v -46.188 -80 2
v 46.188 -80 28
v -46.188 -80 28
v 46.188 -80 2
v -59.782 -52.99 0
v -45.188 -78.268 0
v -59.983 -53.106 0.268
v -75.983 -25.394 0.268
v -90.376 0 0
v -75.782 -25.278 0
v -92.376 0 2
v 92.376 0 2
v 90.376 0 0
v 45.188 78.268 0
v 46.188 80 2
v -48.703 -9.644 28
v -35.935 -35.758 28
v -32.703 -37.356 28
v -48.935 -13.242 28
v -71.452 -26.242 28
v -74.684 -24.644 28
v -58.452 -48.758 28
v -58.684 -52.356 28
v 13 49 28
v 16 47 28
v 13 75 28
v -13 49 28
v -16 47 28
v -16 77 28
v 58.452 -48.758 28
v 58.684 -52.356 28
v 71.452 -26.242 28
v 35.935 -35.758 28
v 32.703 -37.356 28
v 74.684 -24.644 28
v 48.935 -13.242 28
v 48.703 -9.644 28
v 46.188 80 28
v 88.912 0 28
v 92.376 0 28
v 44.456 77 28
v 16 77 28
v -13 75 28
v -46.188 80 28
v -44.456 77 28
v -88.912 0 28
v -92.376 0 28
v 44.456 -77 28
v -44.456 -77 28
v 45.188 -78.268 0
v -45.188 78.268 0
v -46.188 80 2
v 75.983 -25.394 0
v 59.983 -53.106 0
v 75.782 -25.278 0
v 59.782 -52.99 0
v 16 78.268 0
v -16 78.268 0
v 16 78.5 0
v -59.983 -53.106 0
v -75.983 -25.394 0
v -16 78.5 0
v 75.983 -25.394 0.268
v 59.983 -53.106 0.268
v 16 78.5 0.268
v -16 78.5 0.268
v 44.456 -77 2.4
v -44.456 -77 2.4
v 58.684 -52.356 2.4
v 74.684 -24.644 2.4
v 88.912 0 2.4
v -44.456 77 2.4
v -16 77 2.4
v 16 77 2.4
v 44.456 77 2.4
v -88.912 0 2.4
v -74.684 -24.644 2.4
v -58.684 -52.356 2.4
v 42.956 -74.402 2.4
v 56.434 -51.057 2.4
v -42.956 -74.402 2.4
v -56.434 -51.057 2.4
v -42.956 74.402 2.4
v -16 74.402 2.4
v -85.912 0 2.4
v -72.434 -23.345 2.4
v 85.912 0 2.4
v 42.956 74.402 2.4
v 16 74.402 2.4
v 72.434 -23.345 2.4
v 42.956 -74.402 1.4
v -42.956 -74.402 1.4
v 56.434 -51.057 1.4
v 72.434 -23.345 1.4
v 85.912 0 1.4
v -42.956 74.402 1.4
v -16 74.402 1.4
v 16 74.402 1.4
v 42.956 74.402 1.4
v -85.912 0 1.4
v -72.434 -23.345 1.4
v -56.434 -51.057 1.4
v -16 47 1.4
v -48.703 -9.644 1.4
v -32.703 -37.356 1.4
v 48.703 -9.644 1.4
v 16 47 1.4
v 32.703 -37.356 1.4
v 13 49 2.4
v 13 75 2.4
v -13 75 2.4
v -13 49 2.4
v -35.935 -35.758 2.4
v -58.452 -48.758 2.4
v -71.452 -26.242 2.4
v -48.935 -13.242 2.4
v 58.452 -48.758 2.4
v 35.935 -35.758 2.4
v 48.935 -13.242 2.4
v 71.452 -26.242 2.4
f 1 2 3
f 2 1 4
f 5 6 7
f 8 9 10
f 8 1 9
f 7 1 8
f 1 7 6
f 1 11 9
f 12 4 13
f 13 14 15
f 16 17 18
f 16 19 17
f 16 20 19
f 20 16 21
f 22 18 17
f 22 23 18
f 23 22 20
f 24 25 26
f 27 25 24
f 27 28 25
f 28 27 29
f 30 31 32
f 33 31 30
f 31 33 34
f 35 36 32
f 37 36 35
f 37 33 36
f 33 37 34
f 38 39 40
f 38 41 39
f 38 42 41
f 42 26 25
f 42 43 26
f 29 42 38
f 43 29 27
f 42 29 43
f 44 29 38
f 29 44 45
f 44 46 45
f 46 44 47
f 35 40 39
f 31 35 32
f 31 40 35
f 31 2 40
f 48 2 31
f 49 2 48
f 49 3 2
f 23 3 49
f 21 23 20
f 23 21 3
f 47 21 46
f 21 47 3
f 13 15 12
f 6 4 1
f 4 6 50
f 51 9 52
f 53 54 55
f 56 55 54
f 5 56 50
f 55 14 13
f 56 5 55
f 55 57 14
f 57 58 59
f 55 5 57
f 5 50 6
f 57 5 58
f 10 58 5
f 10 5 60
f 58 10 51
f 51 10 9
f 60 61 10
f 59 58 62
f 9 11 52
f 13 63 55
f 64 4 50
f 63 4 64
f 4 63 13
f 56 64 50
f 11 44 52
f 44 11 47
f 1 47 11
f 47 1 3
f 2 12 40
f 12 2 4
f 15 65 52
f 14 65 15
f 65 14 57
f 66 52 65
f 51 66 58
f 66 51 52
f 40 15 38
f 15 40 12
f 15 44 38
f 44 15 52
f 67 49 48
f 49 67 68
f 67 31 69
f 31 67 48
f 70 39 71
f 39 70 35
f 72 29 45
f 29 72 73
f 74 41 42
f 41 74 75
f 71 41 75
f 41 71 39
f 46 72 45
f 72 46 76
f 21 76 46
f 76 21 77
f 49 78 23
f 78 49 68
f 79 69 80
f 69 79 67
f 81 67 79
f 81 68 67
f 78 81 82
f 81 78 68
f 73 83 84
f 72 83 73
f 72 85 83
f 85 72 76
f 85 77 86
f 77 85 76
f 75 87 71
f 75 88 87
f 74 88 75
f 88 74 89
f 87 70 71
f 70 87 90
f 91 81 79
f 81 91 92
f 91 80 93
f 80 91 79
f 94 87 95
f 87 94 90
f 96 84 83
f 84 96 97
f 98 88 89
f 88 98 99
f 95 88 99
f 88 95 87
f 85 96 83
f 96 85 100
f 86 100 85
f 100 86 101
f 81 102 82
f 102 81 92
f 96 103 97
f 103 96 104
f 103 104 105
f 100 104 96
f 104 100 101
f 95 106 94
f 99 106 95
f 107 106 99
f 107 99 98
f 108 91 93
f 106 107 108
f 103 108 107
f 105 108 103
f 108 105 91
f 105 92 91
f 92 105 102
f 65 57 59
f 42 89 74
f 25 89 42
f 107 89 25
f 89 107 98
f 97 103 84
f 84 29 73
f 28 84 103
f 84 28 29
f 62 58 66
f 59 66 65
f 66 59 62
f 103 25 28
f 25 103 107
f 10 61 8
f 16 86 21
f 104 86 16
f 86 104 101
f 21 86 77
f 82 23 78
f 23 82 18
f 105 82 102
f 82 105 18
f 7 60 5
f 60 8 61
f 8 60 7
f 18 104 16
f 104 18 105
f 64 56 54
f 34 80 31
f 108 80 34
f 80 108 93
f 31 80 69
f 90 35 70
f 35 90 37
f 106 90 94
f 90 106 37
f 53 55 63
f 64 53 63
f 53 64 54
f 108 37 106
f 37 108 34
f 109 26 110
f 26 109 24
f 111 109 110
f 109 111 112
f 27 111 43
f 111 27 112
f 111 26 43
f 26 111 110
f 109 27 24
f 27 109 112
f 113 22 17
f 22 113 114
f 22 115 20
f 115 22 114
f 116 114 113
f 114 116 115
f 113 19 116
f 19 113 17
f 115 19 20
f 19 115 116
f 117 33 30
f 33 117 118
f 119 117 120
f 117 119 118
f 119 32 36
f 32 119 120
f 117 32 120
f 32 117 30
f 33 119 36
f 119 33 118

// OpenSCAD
// Hexagonal Dice Rolling Tray with dice storage - original parametric design (Brian Sacco)
// Storage sized from real polyhedral sets: d6 16-18 mm, d20 23-29 mm (largest die of a set).
// Slots are 26 mm square (fits standard acrylic sets' d20 and every smaller die) and sit INSIDE
// the tray against three alternate walls, so a full 7-dice set always has a home and the tray
// keeps a compact hexagonal footprint that fits the print bed.
size      = 160;   // flat-to-flat width (mm)
height    = 28;
wall      = 3;
floor_t   = 2.4;
storage   = true;  // dice slots
die       = 26;    // slot size (mm): 26 = standard polyhedral d20; 18 = d6-only
storage_mode = "inside"; // "inside": slots inside, on 3 alternate walls | "outside": pockets outside 2 opposite walls
felt      = 1.0;   // recess depth for a felt/neoprene insert (0 = none)
$fn = 6;

corner = size / cos(30);            // corner-to-corner
flat_len = corner / 2;              // length of one side of the hexagon
pitch = die + 2;
inner_flat = (size - 2*wall) / cos(30) / 2;   // inner side length
slot_sides = storage_mode == "inside" ? 3 : 2;
slots = storage_mode == "inside"
    ? floor((inner_flat - 2*(die + 4)*tan(30) - 4) / pitch)     // keeps clear of the inner corners
    : floor((flat_len - 6) / pitch);                            // outside pocket fits the flat
echo(str("DICE_TRAY slots_per_side=", slots, " total=", storage ? slots * slot_sides : 0));

module hex(d, h) { cylinder(d=d, h=h, $fn=6); }
// one storage block inside the tray, against the +Y wall ($fn=6 cylinders have vertices on X,
// so the flats face +/-Y); it overlaps the wall so everything fuses
inner_r = size/2 - wall;                       // inner apothem
y0 = storage_mode == "inside" ? inner_r - die - 4 : size/2 - wall;     // block start (towards +Y)
module block() {
    translate([-(slots*pitch)/2 - 2, y0, 0]) cube([slots*pitch + 4, die + 4 + wall/2, height]);
}
module slot_cuts() {
    for (i=[0:slots-1])
        translate([-(slots*pitch)/2 + i*pitch + 1, y0 + 2, floor_t]) cube([die, die, height]);
}
side_angles = storage_mode == "inside" ? [0, 120, 240] : [0, 180];

difference() {
    union() {
        difference() {
            hull() { hex(corner - 4, 0.01); translate([0,0,2]) hex(corner, height - 2); }
            translate([0,0,floor_t]) hex(corner - 2*wall/cos(30), height);
            if (felt > 0) translate([0,0,floor_t - felt]) hex(corner - 2*wall/cos(30) - 6, felt + 0.01);
        }
        // storage blocks are added after the tray is hollowed, so they stay solid
        if (storage) for (k=[0:slot_sides-1]) rotate(side_angles[k]) intersection() {
            block();
            if (storage_mode == "inside") hex(corner - 0.5, height); else translate([-500, -500, 0]) cube([1000, 1000, height]);
        }
    }
    if (storage) for (k=[0:slot_sides-1]) rotate(side_angles[k]) slot_cuts();
}
